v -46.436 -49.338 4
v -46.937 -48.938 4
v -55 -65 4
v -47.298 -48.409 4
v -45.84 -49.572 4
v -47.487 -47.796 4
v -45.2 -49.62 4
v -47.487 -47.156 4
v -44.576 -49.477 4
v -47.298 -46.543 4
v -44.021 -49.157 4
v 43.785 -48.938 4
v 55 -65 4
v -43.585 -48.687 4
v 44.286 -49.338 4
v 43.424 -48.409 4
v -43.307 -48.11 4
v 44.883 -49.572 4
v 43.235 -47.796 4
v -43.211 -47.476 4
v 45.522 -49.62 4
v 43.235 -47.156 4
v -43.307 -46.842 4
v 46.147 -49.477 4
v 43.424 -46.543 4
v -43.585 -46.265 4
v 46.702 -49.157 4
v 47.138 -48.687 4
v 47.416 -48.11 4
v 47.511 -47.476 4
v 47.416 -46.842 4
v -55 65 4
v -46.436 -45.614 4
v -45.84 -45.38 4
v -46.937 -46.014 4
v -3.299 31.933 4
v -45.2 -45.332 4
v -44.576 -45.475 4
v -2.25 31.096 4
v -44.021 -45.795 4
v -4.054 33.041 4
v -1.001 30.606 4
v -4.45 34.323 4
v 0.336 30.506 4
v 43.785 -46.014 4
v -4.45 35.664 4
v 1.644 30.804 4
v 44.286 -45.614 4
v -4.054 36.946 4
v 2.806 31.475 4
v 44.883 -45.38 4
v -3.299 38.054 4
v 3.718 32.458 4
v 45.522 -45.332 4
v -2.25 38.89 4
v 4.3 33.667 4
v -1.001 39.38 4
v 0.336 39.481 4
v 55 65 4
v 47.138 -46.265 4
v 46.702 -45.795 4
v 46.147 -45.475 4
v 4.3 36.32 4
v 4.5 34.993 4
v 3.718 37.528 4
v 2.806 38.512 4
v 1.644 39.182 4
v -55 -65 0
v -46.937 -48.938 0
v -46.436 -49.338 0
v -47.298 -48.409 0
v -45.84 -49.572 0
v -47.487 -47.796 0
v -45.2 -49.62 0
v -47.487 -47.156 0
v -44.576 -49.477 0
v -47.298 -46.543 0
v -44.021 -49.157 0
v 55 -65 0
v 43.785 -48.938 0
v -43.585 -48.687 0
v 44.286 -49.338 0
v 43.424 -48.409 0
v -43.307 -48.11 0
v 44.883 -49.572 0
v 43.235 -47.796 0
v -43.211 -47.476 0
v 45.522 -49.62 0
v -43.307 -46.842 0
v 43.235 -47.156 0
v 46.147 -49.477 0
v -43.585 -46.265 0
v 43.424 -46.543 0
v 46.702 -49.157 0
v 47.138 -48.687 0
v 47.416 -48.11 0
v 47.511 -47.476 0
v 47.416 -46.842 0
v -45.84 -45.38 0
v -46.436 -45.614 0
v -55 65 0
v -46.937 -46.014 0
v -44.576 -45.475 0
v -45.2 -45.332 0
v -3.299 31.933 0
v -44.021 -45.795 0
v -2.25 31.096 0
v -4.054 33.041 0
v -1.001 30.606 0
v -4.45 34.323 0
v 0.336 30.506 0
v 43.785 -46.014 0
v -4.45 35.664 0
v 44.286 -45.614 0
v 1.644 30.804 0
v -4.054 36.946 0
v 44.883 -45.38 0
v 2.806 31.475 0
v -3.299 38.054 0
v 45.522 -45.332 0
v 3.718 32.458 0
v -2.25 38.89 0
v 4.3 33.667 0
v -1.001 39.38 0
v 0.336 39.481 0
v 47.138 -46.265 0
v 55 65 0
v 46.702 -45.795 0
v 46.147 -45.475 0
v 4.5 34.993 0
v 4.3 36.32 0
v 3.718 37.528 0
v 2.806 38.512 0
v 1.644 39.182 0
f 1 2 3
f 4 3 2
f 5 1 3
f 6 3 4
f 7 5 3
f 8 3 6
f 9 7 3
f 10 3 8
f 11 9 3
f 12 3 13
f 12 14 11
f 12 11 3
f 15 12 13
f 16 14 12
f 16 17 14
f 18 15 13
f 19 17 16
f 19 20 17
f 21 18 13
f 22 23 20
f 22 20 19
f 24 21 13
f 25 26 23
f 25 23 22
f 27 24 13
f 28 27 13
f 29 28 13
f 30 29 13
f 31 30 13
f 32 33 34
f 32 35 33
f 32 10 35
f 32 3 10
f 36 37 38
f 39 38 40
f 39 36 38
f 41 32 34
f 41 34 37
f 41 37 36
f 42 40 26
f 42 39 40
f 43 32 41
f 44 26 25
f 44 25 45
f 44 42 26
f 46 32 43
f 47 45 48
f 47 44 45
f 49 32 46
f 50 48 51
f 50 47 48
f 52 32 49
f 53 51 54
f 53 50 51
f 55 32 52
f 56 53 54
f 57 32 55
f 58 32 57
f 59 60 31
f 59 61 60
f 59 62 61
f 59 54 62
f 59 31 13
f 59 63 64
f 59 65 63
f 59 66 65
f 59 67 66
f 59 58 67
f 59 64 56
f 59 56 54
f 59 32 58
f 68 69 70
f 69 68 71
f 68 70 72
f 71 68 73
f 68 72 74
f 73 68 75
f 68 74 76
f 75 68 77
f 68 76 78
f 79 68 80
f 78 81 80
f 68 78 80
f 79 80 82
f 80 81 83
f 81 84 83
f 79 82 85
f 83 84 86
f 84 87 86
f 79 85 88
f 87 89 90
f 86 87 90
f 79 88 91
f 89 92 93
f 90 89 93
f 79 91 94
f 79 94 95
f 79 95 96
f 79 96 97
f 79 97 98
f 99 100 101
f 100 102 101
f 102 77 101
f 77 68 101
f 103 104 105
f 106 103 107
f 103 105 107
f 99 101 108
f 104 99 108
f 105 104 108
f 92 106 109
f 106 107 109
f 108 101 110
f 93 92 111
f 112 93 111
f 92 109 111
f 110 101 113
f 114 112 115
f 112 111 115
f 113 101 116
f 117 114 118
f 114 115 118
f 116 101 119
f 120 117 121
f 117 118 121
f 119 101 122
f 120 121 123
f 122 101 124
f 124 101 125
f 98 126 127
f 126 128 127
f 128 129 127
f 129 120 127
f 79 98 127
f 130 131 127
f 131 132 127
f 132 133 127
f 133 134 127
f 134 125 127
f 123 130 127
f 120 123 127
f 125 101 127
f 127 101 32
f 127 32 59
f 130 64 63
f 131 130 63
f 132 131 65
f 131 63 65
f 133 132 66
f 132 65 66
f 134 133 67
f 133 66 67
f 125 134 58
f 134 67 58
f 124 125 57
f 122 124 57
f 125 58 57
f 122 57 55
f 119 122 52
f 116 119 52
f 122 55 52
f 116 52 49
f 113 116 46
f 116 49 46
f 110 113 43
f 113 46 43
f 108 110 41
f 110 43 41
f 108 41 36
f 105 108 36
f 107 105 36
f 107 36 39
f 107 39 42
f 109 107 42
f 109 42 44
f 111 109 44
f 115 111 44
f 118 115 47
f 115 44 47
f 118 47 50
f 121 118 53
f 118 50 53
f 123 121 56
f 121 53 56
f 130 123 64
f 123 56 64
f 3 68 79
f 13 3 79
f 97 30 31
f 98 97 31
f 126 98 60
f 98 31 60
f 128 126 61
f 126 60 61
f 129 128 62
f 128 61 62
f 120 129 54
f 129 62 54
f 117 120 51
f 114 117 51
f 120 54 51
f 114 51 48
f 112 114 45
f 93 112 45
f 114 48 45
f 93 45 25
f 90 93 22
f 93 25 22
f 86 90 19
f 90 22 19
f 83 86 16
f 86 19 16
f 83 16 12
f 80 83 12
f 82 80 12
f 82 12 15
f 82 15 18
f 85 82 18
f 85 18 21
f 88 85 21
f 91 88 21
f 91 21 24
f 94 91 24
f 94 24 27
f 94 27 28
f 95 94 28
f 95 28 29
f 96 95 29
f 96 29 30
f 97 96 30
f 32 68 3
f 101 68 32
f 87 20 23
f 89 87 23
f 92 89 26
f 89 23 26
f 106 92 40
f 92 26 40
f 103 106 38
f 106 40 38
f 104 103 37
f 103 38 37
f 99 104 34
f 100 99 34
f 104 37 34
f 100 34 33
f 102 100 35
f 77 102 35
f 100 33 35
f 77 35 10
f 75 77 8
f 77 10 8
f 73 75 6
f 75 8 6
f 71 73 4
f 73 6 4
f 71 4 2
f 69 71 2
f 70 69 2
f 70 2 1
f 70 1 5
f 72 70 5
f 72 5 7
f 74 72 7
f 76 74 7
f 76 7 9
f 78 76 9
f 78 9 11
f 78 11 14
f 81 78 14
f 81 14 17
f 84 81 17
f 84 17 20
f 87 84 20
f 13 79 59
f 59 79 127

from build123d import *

# Parameters (mm, degrees)
SKETCH1_W           = 110
SKETCH1_H           = 130
BOSS_EXTRUDE1_DEPTH = 4
SKETCH2_R           = 4.5
CUT_EXTRUDE1_DEPTH  = 4
SKETCH4_R           = 2.15
CUT_EXTRUDE2_DEPTH  = 86.240835285
SKETCH5_R           = 2.15
CUT_EXTRUDE3_DEPTH  = 86.240835285


with BuildPart() as part:
    # Sketch1 → Boss-Extrude1 (new body)
    with BuildSketch(Plane.XY):
        Rectangle(SKETCH1_W, SKETCH1_H)
    extrude(amount=BOSS_EXTRUDE1_DEPTH)

    # Sketch2 → Cut-Extrude1 (cut)
    with BuildSketch(Plane.XY.offset(4)):
        with Locations((0, 34.993291231)):
            Circle(SKETCH2_R)
    extrude(amount=-CUT_EXTRUDE1_DEPTH, mode=Mode.SUBTRACT)

    # Sketch4 → Cut-Extrude2 (cut, through all)
    with BuildSketch(Plane.XY.offset(4)):
        with Locations((-45.36112854, -47.475954891)):
            Circle(SKETCH4_R)
    extrude(amount=-CUT_EXTRUDE2_DEPTH, mode=Mode.SUBTRACT)

    # Sketch5 → Cut-Extrude3 (cut, through all)
    with BuildSketch(Plane.XY.offset(4)):
        with Locations((45.36112854, -47.475954891)):
            Circle(SKETCH5_R)
    extrude(amount=-CUT_EXTRUDE3_DEPTH, mode=Mode.SUBTRACT)


solid = part.part
